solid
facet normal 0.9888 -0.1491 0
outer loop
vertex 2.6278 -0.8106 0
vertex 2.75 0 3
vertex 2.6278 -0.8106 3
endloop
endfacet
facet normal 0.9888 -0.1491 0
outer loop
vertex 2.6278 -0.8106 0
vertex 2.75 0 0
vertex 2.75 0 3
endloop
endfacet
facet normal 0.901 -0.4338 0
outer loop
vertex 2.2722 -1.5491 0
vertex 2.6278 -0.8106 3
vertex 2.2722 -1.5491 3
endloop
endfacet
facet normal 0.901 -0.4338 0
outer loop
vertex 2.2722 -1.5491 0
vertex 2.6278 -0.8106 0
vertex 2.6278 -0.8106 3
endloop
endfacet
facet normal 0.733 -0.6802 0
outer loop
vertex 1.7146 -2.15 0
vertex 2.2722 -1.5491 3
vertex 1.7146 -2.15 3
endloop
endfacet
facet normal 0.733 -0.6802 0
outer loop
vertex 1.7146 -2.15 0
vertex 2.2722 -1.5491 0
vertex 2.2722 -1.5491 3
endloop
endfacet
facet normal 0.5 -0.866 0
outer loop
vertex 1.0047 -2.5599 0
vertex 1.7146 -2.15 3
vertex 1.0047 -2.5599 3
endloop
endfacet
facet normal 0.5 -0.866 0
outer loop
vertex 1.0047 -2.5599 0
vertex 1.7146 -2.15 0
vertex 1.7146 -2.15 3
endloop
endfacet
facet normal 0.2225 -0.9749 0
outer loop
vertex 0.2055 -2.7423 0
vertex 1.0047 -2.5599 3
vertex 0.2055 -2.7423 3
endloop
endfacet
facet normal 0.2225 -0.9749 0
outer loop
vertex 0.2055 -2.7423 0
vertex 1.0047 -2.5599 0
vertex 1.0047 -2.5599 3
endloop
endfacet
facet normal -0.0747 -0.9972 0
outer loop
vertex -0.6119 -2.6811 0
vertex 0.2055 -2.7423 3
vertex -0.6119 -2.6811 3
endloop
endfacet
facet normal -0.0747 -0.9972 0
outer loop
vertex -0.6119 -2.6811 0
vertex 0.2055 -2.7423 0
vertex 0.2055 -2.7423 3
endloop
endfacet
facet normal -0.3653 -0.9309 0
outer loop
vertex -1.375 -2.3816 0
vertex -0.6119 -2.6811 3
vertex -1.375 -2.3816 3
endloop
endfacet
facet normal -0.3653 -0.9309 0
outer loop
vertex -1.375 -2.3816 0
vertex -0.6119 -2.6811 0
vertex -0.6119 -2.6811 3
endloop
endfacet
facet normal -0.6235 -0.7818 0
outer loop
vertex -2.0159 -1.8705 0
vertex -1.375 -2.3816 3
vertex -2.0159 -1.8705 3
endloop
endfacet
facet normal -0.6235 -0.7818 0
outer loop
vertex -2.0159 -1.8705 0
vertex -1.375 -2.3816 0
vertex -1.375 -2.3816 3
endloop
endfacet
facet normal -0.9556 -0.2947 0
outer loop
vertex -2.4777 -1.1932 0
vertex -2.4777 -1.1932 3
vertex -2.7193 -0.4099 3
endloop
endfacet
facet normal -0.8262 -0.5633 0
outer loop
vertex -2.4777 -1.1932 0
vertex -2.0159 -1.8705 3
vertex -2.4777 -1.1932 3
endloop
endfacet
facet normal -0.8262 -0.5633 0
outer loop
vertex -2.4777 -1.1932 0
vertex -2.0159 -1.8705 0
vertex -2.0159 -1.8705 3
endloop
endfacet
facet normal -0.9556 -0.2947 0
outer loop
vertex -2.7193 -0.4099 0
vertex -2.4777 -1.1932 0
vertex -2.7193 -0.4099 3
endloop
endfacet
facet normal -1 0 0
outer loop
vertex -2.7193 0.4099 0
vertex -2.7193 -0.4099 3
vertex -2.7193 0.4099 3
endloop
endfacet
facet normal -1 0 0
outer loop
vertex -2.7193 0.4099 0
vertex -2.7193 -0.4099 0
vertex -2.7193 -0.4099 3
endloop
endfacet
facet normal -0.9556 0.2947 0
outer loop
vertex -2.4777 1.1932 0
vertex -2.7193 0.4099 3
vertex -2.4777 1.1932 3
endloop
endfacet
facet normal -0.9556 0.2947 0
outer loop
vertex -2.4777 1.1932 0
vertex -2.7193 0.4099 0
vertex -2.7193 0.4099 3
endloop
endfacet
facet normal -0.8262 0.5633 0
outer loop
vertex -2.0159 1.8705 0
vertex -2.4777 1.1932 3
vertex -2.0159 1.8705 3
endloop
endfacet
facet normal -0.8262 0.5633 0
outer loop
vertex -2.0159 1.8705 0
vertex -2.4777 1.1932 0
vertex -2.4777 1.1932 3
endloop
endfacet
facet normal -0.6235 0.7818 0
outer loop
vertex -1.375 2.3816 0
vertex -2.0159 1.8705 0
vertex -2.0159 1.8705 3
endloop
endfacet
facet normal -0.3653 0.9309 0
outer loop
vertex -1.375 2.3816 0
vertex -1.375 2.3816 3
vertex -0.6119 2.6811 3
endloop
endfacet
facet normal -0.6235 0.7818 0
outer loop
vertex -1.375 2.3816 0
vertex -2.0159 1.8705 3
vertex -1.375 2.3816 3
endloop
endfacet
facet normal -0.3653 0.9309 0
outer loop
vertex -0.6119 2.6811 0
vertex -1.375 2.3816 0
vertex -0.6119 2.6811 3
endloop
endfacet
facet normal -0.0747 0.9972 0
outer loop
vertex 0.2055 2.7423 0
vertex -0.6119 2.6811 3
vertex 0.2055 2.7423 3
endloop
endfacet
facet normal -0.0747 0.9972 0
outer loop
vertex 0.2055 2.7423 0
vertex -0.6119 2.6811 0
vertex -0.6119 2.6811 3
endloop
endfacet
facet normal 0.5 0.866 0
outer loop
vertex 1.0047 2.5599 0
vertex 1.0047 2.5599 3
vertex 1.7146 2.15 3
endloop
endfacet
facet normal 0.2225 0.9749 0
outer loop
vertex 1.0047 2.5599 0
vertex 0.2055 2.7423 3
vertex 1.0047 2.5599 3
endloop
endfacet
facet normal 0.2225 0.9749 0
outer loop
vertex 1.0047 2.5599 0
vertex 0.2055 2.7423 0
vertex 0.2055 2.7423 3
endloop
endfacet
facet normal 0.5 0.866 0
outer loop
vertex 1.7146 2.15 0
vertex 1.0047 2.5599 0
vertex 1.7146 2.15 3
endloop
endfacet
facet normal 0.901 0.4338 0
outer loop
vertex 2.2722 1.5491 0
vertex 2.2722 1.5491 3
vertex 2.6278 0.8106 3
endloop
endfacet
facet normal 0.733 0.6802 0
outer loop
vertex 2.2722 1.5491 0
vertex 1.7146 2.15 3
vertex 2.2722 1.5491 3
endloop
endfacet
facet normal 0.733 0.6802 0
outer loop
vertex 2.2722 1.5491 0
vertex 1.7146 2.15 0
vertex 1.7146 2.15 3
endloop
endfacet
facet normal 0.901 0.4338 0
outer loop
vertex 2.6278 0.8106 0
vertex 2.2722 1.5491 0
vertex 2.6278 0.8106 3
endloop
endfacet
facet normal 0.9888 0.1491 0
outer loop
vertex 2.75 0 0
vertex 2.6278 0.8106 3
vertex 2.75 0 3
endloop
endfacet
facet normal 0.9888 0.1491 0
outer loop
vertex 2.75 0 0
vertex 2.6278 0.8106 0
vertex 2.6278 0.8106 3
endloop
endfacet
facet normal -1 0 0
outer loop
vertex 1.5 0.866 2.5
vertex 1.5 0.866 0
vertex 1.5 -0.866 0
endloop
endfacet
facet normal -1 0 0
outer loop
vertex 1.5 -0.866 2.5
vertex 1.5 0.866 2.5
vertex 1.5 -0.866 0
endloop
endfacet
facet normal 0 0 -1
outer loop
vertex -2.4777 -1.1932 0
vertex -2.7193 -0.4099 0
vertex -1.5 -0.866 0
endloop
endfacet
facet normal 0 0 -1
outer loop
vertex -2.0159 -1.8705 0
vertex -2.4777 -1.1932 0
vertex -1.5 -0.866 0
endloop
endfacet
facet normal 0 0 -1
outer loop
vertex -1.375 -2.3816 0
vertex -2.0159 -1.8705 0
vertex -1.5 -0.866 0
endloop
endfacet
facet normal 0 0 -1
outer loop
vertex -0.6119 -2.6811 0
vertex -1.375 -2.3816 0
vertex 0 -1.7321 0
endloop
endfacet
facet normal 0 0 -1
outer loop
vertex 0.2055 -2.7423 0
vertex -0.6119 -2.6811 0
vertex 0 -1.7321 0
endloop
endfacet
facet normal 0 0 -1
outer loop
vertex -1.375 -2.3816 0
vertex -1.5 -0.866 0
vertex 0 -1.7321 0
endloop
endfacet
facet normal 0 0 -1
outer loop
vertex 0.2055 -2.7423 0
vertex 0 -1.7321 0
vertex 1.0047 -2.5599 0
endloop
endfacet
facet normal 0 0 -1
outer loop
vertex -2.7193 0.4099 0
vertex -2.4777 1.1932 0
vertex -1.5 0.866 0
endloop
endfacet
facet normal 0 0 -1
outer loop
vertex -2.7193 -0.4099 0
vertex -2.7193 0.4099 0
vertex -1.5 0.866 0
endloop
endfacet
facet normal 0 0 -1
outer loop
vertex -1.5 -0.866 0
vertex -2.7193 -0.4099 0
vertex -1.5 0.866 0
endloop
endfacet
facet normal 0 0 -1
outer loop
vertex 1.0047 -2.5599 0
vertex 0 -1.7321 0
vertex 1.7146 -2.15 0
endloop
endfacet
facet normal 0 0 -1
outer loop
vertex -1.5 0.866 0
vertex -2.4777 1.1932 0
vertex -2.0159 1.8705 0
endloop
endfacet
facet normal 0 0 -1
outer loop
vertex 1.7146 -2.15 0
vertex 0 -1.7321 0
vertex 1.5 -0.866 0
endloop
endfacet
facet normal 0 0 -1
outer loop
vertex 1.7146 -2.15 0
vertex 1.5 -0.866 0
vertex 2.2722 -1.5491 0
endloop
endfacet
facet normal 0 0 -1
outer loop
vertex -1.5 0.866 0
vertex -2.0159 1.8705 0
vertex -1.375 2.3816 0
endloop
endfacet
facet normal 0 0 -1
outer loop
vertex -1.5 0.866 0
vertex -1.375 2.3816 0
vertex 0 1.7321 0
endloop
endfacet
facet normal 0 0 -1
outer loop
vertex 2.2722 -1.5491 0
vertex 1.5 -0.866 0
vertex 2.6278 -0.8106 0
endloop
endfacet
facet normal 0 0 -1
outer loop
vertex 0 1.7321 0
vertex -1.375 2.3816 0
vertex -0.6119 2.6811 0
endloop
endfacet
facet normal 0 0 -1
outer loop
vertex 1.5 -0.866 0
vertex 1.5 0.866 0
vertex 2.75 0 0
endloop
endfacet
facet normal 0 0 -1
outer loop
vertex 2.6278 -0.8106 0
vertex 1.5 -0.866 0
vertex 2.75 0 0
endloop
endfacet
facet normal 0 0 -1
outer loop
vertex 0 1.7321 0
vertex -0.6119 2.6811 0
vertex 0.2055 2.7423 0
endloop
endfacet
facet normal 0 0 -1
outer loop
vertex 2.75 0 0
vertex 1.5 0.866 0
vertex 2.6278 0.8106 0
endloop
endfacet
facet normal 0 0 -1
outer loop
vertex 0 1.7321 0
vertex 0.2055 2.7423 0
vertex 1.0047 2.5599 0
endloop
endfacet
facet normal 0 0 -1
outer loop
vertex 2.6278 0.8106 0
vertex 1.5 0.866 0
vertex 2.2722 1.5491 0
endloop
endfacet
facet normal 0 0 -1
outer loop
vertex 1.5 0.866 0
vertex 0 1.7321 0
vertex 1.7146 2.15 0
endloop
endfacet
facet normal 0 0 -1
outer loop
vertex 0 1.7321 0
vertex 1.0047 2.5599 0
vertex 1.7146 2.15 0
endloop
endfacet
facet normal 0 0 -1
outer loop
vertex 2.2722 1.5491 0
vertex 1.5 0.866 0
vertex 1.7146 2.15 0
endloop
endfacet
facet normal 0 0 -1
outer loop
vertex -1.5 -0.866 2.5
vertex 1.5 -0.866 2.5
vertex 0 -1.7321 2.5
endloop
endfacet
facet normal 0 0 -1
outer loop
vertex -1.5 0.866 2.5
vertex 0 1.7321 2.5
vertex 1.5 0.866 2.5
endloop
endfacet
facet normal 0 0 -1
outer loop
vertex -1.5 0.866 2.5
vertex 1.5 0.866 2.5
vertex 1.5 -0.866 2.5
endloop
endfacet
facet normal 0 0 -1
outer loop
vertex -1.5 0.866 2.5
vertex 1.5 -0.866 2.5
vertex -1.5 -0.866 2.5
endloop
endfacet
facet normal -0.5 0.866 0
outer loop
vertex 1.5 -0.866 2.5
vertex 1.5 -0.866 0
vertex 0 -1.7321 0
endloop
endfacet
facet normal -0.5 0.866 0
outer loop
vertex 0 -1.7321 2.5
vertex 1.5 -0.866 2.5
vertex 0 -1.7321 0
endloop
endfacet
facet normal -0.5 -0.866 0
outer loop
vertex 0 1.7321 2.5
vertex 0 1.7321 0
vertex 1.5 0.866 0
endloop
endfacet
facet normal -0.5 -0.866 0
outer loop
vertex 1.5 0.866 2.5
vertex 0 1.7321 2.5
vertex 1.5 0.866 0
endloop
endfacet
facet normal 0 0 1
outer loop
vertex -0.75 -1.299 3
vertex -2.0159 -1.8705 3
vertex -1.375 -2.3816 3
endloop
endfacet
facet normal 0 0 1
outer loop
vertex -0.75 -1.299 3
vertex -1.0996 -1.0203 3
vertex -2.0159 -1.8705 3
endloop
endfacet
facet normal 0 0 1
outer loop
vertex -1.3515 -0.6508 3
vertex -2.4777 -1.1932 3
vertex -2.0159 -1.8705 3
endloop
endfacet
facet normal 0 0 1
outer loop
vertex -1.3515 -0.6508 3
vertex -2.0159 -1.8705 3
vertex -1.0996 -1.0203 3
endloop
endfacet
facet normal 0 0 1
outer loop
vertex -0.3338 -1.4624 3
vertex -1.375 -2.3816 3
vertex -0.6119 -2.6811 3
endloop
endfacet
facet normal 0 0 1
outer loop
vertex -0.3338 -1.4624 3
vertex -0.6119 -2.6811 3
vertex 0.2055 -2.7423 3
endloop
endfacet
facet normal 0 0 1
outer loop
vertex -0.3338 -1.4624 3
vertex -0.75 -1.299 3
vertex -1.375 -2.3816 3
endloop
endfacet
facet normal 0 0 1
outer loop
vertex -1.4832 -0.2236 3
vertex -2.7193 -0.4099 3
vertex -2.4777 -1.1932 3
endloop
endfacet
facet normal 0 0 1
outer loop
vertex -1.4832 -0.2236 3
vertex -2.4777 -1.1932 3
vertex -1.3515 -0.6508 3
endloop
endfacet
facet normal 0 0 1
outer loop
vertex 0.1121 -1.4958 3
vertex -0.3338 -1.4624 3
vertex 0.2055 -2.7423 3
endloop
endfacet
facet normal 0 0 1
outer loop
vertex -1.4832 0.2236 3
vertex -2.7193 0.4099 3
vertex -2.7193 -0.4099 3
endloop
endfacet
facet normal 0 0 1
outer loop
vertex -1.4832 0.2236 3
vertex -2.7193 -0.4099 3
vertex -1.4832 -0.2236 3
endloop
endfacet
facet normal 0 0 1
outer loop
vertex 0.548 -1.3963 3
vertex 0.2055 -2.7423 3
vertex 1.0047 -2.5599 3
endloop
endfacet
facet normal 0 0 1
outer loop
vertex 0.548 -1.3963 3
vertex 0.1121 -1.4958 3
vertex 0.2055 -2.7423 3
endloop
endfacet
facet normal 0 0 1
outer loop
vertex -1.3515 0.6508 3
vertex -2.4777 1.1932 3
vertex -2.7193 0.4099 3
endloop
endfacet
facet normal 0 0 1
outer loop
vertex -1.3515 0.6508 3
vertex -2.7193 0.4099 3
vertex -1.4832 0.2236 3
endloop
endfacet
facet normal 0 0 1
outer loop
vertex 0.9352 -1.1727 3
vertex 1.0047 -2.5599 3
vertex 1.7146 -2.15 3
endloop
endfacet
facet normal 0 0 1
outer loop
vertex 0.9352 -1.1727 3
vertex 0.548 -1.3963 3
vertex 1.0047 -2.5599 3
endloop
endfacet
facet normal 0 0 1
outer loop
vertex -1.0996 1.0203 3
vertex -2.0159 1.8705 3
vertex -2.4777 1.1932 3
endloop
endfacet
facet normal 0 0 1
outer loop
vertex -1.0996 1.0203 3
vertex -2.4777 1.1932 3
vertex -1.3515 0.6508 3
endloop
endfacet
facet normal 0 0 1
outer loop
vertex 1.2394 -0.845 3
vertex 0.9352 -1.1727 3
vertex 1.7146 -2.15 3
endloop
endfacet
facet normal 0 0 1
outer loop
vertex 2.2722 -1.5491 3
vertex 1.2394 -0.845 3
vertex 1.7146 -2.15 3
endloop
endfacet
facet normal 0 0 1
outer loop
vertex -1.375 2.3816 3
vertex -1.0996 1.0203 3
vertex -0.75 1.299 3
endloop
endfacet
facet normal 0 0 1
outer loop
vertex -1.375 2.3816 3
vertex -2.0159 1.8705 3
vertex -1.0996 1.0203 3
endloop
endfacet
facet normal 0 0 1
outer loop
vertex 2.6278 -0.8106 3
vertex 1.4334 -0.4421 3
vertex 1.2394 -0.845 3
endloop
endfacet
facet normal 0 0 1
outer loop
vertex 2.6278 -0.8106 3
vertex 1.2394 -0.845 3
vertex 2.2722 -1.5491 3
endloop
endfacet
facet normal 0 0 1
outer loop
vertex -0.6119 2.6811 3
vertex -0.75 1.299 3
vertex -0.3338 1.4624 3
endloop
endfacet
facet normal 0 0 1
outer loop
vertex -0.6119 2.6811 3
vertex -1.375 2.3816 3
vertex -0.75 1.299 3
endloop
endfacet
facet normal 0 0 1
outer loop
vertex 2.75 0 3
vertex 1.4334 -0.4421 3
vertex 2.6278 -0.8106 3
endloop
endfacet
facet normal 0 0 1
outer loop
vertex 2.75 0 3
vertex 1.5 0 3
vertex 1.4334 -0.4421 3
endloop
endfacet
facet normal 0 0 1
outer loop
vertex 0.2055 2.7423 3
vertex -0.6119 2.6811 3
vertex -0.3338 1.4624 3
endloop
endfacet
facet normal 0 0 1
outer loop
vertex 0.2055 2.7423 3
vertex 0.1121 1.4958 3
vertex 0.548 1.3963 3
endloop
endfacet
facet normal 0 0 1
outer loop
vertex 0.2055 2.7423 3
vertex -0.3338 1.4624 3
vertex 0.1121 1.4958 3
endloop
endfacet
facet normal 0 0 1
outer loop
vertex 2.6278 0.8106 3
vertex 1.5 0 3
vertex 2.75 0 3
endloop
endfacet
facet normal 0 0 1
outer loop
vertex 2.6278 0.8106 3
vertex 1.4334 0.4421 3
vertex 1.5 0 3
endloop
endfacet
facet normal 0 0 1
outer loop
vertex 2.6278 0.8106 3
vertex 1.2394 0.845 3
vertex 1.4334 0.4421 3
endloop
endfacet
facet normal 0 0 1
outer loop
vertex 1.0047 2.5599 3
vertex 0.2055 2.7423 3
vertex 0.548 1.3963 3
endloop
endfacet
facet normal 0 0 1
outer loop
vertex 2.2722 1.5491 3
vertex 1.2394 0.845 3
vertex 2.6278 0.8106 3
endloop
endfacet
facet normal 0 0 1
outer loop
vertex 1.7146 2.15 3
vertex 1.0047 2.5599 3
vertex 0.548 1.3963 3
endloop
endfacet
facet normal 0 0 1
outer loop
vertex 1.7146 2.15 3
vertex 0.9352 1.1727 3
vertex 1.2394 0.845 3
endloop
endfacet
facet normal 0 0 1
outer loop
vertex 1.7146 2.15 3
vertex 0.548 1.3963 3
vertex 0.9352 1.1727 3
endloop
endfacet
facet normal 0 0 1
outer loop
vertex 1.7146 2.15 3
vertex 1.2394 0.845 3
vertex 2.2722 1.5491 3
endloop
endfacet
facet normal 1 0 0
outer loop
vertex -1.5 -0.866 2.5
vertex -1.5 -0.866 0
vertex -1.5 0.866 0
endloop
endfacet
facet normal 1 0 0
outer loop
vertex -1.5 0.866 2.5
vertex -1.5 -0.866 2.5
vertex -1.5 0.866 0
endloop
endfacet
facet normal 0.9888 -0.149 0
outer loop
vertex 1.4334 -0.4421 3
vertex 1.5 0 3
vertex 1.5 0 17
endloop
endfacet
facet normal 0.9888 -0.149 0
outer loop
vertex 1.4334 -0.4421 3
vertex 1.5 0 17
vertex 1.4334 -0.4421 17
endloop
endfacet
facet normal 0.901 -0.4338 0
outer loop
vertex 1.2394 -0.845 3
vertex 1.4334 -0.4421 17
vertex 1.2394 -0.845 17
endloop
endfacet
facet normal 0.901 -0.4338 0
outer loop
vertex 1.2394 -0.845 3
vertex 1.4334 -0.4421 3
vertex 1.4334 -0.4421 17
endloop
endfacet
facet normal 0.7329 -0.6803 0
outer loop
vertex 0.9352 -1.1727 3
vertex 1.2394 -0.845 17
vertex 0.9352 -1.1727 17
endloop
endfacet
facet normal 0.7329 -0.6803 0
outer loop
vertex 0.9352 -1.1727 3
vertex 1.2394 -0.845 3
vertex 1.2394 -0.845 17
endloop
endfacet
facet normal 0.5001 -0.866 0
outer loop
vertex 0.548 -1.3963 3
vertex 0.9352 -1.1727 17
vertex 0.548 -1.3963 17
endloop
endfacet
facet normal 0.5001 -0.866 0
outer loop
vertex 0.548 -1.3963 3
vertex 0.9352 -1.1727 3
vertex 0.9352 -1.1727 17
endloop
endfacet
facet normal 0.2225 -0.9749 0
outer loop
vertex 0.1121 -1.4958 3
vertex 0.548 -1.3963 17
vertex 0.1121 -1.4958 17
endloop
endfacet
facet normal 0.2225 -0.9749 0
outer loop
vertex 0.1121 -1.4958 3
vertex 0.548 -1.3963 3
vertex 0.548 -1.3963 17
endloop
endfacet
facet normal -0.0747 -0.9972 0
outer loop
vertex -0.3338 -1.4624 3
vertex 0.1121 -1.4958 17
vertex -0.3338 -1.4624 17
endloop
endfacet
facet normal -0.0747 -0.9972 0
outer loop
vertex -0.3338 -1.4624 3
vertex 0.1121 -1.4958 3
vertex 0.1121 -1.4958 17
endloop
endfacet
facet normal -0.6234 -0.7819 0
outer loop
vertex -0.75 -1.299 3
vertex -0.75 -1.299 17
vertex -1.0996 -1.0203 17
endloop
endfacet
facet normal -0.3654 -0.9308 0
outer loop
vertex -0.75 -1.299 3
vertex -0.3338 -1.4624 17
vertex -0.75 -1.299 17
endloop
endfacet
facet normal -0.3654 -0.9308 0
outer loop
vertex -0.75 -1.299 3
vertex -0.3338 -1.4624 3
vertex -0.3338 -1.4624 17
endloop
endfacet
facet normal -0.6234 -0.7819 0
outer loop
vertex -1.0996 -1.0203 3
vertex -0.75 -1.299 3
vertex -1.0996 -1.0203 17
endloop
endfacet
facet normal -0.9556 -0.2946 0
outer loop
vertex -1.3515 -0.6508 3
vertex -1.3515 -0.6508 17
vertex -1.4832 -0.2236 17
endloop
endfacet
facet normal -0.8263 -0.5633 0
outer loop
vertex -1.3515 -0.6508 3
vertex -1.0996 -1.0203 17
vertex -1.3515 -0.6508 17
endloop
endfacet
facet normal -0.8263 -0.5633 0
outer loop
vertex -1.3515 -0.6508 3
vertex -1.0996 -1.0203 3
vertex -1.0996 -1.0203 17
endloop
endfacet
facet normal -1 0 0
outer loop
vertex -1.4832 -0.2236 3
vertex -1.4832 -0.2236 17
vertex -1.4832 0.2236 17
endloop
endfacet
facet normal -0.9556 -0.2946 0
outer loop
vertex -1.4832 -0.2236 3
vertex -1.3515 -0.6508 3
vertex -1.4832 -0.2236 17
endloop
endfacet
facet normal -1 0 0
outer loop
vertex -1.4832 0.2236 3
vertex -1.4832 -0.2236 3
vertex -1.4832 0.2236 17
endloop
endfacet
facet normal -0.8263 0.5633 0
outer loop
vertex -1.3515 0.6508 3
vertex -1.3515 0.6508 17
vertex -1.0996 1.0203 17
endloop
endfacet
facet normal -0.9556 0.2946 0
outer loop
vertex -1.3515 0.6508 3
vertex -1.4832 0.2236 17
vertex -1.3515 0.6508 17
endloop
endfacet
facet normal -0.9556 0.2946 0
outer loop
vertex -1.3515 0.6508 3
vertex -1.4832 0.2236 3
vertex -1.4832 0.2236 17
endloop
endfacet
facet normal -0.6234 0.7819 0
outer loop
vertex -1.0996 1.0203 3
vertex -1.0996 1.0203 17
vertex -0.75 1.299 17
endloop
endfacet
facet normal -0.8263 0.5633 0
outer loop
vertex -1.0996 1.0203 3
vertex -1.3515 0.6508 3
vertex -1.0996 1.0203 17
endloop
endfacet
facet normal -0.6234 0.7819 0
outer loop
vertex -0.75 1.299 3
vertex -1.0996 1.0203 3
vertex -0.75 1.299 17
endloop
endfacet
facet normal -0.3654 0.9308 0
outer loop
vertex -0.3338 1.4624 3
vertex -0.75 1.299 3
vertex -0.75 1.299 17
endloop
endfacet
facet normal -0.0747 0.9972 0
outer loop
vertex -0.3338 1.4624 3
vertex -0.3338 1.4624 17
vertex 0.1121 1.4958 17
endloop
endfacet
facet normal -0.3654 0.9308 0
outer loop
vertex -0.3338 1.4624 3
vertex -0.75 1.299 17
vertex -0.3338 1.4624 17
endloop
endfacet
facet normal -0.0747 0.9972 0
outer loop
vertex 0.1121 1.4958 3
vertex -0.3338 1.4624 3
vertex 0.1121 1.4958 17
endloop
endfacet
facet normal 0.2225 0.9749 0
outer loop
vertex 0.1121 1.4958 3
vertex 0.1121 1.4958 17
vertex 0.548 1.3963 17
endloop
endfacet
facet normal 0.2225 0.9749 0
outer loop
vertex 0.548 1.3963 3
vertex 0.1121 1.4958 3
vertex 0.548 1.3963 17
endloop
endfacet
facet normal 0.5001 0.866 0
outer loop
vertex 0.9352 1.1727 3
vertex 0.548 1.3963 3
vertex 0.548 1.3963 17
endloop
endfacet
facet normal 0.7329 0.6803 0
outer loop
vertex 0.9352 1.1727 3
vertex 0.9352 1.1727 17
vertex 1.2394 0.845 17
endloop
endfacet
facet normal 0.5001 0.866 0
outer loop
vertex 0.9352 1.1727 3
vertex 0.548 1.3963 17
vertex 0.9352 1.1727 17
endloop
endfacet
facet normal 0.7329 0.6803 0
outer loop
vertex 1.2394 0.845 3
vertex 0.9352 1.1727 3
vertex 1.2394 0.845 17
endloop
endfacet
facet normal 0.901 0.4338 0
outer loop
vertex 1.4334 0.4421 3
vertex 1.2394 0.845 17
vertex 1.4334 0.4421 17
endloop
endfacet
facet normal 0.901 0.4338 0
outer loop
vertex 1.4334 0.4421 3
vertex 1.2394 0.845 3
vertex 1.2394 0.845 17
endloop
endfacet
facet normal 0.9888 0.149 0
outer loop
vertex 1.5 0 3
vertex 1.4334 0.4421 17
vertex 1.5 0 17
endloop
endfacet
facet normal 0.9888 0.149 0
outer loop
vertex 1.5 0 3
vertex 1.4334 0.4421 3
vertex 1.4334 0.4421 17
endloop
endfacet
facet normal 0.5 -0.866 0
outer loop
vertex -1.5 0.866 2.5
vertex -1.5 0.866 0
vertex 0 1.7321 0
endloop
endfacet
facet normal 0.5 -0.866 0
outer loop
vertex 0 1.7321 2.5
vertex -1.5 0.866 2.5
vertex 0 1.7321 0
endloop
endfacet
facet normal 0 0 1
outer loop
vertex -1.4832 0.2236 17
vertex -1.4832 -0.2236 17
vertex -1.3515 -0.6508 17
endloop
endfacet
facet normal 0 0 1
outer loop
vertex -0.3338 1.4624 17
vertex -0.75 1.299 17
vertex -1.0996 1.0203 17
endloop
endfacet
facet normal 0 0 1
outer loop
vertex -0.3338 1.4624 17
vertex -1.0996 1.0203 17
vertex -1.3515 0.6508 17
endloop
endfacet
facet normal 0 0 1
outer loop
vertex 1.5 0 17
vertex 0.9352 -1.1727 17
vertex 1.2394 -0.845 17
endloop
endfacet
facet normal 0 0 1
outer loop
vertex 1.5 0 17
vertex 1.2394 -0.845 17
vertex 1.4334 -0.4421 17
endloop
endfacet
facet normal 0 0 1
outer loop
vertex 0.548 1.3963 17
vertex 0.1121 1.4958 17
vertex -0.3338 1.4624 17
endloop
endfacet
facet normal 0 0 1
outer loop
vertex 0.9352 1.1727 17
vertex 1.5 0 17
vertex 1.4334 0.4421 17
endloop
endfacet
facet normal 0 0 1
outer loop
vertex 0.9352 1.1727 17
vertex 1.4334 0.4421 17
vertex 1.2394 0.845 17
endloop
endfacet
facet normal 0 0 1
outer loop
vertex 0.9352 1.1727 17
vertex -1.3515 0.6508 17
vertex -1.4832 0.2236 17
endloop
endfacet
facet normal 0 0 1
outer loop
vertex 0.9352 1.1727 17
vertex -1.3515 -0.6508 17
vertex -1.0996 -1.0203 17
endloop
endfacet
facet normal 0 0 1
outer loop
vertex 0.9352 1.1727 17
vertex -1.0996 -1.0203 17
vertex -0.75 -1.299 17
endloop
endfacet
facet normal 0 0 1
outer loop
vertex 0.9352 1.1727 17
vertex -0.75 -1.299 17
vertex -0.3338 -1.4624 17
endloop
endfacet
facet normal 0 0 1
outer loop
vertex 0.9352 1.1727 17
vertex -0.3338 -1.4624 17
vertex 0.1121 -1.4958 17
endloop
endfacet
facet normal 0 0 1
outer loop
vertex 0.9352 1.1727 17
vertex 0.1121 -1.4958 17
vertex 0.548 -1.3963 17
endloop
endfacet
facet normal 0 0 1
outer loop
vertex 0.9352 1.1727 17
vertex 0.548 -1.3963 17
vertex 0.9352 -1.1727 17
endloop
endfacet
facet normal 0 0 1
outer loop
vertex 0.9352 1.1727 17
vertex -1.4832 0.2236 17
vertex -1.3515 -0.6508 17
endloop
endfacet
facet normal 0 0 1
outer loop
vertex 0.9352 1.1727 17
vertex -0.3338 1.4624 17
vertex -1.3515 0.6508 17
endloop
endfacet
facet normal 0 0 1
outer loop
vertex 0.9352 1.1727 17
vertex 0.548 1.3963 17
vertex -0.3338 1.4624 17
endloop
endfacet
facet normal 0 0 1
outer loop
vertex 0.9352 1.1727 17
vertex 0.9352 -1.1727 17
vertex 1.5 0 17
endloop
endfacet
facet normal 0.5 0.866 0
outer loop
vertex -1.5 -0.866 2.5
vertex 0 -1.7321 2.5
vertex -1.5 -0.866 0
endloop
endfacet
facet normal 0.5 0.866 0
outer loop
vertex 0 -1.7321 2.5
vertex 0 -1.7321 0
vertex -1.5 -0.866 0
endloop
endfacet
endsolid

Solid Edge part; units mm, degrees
sketch "Sketch1" plane through (0, 0, 0) normal (0, 0, 1) x (1, 0, 0)
  circle A0 centre (0, 0) radius 2.75
  dimension "D1" = 5.5
extrude "Protrusion1" add sketch "Sketch1" along normal blind 3
sketch "Sketch2" plane through (0, 0, 3) normal (0, 0, 1) x (1, 0, 0)
  circle A0 centre (0, 0) radius 1.5
  dimension "D1" = 3
extrude "Bult" add sketch "Sketch2" along normal blind 14
sketch "Sketch3" plane through (0, 0, 0) normal (0, 0, -1) x (1, 0, 0)
  line L0 (1.5, 0.866) -> (0, 1.7321)
  line L1 (0, 1.7321) -> (-1.5, 0.866)
  line L2 (-1.5, 0.866) -> (-1.5, -0.866)
  line L3 (-1.5, -0.866) -> (0, -1.7321)
  line L4 (0, -1.7321) -> (1.5, -0.866)
  line L5 (1.5, -0.866) -> (1.5, 0.866)
  dimension "D1" = 3
  dimension "D2" = 1.5
extrude "Försänkning_skruv" cut sketch "Sketch3" against normal blind 2.5
